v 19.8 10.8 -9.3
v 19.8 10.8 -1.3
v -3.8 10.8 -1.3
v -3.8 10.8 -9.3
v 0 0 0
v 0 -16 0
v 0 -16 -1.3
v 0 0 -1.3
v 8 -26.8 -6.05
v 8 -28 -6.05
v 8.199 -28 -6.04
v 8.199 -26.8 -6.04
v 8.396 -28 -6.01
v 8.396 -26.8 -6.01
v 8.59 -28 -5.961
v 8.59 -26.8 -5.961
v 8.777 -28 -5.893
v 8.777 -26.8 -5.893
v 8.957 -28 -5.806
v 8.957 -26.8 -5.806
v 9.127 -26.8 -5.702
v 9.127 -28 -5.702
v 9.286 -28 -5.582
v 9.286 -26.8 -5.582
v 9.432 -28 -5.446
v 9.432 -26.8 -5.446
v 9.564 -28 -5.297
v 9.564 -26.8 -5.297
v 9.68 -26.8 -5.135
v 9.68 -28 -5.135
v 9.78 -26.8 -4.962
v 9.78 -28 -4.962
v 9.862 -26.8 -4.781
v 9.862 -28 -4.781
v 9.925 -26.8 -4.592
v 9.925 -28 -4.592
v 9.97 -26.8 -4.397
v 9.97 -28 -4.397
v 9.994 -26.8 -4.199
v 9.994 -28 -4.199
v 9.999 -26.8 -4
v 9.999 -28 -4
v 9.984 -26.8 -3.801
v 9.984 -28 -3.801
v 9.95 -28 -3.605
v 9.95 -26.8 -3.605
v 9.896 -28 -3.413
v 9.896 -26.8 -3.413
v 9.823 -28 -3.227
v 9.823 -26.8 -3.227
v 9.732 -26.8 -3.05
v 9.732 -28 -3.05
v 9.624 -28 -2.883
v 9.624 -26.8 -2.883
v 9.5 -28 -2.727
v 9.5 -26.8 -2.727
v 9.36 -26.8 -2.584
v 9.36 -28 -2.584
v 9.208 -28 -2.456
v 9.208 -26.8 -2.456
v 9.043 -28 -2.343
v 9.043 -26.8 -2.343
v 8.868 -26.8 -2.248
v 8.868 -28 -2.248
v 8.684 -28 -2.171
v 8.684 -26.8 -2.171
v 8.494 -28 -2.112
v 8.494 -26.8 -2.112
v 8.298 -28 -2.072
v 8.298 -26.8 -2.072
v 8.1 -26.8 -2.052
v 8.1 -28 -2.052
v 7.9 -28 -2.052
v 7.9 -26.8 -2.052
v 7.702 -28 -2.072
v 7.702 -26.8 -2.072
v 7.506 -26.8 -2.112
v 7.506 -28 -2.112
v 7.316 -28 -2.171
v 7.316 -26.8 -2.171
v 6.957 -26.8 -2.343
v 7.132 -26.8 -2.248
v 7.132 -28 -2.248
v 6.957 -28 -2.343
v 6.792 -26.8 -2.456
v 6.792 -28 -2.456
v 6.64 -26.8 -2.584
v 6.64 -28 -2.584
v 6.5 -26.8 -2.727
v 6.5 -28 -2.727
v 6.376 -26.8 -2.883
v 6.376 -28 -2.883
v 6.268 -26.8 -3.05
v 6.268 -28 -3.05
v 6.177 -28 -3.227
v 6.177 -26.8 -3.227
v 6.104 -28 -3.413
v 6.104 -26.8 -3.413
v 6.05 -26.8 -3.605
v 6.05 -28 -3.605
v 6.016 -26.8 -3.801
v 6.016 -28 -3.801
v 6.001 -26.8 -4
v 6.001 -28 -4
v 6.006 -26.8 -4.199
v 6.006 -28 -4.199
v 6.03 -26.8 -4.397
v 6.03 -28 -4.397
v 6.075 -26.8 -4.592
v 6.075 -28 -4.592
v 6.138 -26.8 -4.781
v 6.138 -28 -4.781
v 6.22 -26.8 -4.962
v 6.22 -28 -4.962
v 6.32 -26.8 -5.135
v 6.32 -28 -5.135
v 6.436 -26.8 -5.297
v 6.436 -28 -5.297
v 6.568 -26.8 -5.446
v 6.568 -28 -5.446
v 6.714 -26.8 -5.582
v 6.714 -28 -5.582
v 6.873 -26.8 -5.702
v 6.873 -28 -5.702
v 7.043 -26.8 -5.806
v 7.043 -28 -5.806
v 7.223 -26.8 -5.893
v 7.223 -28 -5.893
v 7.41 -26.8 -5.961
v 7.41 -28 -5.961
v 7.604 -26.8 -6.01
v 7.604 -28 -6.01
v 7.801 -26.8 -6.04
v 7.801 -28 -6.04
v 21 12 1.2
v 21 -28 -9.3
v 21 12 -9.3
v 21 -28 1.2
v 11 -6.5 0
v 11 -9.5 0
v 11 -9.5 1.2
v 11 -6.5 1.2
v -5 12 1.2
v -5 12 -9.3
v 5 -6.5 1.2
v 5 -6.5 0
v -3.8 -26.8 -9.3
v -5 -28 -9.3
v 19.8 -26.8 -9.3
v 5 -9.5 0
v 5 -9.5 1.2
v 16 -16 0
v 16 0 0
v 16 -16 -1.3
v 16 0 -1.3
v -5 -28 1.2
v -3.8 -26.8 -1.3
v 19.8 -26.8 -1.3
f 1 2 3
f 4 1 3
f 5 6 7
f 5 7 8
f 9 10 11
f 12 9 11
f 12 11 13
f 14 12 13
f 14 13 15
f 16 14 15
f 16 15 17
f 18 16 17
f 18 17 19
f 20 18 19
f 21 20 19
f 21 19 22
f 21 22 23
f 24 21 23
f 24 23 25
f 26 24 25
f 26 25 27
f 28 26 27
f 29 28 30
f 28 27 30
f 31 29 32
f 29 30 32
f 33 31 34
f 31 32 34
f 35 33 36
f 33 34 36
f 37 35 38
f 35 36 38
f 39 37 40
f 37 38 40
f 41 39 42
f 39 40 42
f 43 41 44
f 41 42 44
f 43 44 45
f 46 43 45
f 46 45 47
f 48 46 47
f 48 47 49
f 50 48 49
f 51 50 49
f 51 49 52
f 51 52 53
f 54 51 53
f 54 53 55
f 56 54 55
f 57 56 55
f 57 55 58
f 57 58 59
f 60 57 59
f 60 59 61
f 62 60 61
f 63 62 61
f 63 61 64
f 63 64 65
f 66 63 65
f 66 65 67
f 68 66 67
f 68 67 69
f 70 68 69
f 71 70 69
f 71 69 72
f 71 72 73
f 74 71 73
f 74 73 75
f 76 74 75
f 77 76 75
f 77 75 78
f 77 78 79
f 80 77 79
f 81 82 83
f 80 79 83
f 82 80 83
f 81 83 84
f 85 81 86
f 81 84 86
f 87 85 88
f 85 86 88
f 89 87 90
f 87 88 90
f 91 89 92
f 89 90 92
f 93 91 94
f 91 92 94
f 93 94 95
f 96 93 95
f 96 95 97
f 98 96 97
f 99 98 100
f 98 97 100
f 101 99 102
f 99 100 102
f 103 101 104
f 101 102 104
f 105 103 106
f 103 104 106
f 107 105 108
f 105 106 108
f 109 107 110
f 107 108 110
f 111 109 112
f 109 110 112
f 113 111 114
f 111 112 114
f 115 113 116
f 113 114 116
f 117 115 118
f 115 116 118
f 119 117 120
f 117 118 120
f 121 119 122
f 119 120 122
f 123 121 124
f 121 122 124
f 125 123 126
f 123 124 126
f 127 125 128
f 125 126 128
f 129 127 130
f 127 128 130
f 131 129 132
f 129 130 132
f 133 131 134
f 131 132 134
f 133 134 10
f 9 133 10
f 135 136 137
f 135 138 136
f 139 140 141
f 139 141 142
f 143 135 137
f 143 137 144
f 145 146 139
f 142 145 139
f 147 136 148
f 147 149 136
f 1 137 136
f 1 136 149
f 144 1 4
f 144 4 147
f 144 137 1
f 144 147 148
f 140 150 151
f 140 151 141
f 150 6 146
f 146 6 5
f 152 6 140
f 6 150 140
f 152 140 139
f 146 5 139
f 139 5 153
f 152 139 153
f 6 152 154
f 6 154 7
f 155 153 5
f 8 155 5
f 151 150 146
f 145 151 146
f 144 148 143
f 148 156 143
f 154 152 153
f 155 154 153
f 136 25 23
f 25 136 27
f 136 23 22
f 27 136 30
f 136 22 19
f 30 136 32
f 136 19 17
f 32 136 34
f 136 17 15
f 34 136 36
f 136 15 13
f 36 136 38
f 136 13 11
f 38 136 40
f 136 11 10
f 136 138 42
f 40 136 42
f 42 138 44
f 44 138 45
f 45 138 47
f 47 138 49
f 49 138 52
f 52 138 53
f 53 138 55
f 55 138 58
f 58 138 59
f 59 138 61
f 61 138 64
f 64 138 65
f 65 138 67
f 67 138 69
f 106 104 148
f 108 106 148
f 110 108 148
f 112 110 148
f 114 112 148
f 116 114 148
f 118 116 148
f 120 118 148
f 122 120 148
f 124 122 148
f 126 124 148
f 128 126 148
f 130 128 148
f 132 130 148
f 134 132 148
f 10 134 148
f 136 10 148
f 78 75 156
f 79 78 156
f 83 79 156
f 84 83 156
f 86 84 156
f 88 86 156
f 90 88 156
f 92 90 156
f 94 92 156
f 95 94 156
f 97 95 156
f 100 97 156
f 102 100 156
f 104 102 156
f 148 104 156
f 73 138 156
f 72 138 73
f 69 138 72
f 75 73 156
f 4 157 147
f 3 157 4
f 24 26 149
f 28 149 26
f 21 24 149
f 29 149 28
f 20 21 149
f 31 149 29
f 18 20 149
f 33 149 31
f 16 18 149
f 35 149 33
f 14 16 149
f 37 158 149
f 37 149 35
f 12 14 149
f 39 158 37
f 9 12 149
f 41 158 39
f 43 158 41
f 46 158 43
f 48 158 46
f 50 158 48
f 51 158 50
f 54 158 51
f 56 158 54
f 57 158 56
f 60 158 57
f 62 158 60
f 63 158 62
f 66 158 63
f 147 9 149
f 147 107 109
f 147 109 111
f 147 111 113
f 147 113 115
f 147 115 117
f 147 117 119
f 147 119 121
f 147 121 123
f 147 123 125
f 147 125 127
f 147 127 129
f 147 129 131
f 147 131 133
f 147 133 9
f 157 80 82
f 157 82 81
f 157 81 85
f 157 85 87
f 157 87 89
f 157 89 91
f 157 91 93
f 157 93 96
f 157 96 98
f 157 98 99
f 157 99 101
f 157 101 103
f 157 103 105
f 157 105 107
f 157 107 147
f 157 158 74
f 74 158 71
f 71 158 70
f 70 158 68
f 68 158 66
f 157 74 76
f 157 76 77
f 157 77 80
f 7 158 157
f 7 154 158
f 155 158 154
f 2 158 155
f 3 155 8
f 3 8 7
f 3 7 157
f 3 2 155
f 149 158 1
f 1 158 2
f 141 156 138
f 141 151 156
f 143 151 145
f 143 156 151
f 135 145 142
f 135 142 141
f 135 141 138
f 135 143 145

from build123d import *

# Parameters (mm, degrees)
SKETCH1_W           = 26
SKETCH1_H           = 40
SKETCH1_W_2         = 6
SKETCH1_H_2         = 3
BOSS_EXTRUDE1_DEPTH = 1.2
SKETCH2_W           = 26
SKETCH2_H           = 40
SKETCH2_W_2         = 16
SKETCH2_H_2         = 16
BOSS_EXTRUDE2_DEPTH = 1.3
SKETCH5_W           = 26
SKETCH5_H           = 40
SKETCH5_W_2         = 23.6
SKETCH5_H_2         = 37.6
BOSS_EXTRUDE3_DEPTH = 8
SKETCH6_R           = 2
CUT_EXTRUDE1_DEPTH  = 8


with BuildPart() as part:
    # Sketch1 → Boss-Extrude1 (new body)
    with BuildSketch(Plane.XY):
        with Locations((8, -8)):
            Rectangle(SKETCH1_W, SKETCH1_H)
        with Locations((8, -8)):
            Rectangle(SKETCH1_W_2, SKETCH1_H_2, mode=Mode.SUBTRACT)
    extrude(amount=BOSS_EXTRUDE1_DEPTH)

    # Sketch2 → Boss-Extrude2 (add)
    with BuildSketch(Plane(origin=(0, 0, 0), x_dir=(-1, 0, 0), z_dir=(0, 0, -1))):
        with Locations((-8, -8)):
            Rectangle(SKETCH2_W, SKETCH2_H)
        with Locations((-8, -8)):
            Rectangle(SKETCH2_W_2, SKETCH2_H_2, mode=Mode.SUBTRACT)
    extrude(amount=BOSS_EXTRUDE2_DEPTH)

    # Sketch5 → Boss-Extrude3 (add)
    with BuildSketch(Plane(origin=(0, 0, -1.3), x_dir=(-1, 0, 0), z_dir=(0, 0, -1))):
        with Locations((-8, -8)):
            Rectangle(SKETCH5_W, SKETCH5_H)
        with Locations((-8, -8)):
            Rectangle(SKETCH5_W_2, SKETCH5_H_2, mode=Mode.SUBTRACT)
    extrude(amount=BOSS_EXTRUDE3_DEPTH)

    # Sketch6 → Cut-Extrude1 (cut)
    with BuildSketch(Plane.XZ.offset(28)):
        with Locations(Location((8, -4.05, 0), (0, 0, 270))):
            Circle(SKETCH6_R)
    extrude(amount=-CUT_EXTRUDE1_DEPTH, mode=Mode.SUBTRACT)


solid = part.part
